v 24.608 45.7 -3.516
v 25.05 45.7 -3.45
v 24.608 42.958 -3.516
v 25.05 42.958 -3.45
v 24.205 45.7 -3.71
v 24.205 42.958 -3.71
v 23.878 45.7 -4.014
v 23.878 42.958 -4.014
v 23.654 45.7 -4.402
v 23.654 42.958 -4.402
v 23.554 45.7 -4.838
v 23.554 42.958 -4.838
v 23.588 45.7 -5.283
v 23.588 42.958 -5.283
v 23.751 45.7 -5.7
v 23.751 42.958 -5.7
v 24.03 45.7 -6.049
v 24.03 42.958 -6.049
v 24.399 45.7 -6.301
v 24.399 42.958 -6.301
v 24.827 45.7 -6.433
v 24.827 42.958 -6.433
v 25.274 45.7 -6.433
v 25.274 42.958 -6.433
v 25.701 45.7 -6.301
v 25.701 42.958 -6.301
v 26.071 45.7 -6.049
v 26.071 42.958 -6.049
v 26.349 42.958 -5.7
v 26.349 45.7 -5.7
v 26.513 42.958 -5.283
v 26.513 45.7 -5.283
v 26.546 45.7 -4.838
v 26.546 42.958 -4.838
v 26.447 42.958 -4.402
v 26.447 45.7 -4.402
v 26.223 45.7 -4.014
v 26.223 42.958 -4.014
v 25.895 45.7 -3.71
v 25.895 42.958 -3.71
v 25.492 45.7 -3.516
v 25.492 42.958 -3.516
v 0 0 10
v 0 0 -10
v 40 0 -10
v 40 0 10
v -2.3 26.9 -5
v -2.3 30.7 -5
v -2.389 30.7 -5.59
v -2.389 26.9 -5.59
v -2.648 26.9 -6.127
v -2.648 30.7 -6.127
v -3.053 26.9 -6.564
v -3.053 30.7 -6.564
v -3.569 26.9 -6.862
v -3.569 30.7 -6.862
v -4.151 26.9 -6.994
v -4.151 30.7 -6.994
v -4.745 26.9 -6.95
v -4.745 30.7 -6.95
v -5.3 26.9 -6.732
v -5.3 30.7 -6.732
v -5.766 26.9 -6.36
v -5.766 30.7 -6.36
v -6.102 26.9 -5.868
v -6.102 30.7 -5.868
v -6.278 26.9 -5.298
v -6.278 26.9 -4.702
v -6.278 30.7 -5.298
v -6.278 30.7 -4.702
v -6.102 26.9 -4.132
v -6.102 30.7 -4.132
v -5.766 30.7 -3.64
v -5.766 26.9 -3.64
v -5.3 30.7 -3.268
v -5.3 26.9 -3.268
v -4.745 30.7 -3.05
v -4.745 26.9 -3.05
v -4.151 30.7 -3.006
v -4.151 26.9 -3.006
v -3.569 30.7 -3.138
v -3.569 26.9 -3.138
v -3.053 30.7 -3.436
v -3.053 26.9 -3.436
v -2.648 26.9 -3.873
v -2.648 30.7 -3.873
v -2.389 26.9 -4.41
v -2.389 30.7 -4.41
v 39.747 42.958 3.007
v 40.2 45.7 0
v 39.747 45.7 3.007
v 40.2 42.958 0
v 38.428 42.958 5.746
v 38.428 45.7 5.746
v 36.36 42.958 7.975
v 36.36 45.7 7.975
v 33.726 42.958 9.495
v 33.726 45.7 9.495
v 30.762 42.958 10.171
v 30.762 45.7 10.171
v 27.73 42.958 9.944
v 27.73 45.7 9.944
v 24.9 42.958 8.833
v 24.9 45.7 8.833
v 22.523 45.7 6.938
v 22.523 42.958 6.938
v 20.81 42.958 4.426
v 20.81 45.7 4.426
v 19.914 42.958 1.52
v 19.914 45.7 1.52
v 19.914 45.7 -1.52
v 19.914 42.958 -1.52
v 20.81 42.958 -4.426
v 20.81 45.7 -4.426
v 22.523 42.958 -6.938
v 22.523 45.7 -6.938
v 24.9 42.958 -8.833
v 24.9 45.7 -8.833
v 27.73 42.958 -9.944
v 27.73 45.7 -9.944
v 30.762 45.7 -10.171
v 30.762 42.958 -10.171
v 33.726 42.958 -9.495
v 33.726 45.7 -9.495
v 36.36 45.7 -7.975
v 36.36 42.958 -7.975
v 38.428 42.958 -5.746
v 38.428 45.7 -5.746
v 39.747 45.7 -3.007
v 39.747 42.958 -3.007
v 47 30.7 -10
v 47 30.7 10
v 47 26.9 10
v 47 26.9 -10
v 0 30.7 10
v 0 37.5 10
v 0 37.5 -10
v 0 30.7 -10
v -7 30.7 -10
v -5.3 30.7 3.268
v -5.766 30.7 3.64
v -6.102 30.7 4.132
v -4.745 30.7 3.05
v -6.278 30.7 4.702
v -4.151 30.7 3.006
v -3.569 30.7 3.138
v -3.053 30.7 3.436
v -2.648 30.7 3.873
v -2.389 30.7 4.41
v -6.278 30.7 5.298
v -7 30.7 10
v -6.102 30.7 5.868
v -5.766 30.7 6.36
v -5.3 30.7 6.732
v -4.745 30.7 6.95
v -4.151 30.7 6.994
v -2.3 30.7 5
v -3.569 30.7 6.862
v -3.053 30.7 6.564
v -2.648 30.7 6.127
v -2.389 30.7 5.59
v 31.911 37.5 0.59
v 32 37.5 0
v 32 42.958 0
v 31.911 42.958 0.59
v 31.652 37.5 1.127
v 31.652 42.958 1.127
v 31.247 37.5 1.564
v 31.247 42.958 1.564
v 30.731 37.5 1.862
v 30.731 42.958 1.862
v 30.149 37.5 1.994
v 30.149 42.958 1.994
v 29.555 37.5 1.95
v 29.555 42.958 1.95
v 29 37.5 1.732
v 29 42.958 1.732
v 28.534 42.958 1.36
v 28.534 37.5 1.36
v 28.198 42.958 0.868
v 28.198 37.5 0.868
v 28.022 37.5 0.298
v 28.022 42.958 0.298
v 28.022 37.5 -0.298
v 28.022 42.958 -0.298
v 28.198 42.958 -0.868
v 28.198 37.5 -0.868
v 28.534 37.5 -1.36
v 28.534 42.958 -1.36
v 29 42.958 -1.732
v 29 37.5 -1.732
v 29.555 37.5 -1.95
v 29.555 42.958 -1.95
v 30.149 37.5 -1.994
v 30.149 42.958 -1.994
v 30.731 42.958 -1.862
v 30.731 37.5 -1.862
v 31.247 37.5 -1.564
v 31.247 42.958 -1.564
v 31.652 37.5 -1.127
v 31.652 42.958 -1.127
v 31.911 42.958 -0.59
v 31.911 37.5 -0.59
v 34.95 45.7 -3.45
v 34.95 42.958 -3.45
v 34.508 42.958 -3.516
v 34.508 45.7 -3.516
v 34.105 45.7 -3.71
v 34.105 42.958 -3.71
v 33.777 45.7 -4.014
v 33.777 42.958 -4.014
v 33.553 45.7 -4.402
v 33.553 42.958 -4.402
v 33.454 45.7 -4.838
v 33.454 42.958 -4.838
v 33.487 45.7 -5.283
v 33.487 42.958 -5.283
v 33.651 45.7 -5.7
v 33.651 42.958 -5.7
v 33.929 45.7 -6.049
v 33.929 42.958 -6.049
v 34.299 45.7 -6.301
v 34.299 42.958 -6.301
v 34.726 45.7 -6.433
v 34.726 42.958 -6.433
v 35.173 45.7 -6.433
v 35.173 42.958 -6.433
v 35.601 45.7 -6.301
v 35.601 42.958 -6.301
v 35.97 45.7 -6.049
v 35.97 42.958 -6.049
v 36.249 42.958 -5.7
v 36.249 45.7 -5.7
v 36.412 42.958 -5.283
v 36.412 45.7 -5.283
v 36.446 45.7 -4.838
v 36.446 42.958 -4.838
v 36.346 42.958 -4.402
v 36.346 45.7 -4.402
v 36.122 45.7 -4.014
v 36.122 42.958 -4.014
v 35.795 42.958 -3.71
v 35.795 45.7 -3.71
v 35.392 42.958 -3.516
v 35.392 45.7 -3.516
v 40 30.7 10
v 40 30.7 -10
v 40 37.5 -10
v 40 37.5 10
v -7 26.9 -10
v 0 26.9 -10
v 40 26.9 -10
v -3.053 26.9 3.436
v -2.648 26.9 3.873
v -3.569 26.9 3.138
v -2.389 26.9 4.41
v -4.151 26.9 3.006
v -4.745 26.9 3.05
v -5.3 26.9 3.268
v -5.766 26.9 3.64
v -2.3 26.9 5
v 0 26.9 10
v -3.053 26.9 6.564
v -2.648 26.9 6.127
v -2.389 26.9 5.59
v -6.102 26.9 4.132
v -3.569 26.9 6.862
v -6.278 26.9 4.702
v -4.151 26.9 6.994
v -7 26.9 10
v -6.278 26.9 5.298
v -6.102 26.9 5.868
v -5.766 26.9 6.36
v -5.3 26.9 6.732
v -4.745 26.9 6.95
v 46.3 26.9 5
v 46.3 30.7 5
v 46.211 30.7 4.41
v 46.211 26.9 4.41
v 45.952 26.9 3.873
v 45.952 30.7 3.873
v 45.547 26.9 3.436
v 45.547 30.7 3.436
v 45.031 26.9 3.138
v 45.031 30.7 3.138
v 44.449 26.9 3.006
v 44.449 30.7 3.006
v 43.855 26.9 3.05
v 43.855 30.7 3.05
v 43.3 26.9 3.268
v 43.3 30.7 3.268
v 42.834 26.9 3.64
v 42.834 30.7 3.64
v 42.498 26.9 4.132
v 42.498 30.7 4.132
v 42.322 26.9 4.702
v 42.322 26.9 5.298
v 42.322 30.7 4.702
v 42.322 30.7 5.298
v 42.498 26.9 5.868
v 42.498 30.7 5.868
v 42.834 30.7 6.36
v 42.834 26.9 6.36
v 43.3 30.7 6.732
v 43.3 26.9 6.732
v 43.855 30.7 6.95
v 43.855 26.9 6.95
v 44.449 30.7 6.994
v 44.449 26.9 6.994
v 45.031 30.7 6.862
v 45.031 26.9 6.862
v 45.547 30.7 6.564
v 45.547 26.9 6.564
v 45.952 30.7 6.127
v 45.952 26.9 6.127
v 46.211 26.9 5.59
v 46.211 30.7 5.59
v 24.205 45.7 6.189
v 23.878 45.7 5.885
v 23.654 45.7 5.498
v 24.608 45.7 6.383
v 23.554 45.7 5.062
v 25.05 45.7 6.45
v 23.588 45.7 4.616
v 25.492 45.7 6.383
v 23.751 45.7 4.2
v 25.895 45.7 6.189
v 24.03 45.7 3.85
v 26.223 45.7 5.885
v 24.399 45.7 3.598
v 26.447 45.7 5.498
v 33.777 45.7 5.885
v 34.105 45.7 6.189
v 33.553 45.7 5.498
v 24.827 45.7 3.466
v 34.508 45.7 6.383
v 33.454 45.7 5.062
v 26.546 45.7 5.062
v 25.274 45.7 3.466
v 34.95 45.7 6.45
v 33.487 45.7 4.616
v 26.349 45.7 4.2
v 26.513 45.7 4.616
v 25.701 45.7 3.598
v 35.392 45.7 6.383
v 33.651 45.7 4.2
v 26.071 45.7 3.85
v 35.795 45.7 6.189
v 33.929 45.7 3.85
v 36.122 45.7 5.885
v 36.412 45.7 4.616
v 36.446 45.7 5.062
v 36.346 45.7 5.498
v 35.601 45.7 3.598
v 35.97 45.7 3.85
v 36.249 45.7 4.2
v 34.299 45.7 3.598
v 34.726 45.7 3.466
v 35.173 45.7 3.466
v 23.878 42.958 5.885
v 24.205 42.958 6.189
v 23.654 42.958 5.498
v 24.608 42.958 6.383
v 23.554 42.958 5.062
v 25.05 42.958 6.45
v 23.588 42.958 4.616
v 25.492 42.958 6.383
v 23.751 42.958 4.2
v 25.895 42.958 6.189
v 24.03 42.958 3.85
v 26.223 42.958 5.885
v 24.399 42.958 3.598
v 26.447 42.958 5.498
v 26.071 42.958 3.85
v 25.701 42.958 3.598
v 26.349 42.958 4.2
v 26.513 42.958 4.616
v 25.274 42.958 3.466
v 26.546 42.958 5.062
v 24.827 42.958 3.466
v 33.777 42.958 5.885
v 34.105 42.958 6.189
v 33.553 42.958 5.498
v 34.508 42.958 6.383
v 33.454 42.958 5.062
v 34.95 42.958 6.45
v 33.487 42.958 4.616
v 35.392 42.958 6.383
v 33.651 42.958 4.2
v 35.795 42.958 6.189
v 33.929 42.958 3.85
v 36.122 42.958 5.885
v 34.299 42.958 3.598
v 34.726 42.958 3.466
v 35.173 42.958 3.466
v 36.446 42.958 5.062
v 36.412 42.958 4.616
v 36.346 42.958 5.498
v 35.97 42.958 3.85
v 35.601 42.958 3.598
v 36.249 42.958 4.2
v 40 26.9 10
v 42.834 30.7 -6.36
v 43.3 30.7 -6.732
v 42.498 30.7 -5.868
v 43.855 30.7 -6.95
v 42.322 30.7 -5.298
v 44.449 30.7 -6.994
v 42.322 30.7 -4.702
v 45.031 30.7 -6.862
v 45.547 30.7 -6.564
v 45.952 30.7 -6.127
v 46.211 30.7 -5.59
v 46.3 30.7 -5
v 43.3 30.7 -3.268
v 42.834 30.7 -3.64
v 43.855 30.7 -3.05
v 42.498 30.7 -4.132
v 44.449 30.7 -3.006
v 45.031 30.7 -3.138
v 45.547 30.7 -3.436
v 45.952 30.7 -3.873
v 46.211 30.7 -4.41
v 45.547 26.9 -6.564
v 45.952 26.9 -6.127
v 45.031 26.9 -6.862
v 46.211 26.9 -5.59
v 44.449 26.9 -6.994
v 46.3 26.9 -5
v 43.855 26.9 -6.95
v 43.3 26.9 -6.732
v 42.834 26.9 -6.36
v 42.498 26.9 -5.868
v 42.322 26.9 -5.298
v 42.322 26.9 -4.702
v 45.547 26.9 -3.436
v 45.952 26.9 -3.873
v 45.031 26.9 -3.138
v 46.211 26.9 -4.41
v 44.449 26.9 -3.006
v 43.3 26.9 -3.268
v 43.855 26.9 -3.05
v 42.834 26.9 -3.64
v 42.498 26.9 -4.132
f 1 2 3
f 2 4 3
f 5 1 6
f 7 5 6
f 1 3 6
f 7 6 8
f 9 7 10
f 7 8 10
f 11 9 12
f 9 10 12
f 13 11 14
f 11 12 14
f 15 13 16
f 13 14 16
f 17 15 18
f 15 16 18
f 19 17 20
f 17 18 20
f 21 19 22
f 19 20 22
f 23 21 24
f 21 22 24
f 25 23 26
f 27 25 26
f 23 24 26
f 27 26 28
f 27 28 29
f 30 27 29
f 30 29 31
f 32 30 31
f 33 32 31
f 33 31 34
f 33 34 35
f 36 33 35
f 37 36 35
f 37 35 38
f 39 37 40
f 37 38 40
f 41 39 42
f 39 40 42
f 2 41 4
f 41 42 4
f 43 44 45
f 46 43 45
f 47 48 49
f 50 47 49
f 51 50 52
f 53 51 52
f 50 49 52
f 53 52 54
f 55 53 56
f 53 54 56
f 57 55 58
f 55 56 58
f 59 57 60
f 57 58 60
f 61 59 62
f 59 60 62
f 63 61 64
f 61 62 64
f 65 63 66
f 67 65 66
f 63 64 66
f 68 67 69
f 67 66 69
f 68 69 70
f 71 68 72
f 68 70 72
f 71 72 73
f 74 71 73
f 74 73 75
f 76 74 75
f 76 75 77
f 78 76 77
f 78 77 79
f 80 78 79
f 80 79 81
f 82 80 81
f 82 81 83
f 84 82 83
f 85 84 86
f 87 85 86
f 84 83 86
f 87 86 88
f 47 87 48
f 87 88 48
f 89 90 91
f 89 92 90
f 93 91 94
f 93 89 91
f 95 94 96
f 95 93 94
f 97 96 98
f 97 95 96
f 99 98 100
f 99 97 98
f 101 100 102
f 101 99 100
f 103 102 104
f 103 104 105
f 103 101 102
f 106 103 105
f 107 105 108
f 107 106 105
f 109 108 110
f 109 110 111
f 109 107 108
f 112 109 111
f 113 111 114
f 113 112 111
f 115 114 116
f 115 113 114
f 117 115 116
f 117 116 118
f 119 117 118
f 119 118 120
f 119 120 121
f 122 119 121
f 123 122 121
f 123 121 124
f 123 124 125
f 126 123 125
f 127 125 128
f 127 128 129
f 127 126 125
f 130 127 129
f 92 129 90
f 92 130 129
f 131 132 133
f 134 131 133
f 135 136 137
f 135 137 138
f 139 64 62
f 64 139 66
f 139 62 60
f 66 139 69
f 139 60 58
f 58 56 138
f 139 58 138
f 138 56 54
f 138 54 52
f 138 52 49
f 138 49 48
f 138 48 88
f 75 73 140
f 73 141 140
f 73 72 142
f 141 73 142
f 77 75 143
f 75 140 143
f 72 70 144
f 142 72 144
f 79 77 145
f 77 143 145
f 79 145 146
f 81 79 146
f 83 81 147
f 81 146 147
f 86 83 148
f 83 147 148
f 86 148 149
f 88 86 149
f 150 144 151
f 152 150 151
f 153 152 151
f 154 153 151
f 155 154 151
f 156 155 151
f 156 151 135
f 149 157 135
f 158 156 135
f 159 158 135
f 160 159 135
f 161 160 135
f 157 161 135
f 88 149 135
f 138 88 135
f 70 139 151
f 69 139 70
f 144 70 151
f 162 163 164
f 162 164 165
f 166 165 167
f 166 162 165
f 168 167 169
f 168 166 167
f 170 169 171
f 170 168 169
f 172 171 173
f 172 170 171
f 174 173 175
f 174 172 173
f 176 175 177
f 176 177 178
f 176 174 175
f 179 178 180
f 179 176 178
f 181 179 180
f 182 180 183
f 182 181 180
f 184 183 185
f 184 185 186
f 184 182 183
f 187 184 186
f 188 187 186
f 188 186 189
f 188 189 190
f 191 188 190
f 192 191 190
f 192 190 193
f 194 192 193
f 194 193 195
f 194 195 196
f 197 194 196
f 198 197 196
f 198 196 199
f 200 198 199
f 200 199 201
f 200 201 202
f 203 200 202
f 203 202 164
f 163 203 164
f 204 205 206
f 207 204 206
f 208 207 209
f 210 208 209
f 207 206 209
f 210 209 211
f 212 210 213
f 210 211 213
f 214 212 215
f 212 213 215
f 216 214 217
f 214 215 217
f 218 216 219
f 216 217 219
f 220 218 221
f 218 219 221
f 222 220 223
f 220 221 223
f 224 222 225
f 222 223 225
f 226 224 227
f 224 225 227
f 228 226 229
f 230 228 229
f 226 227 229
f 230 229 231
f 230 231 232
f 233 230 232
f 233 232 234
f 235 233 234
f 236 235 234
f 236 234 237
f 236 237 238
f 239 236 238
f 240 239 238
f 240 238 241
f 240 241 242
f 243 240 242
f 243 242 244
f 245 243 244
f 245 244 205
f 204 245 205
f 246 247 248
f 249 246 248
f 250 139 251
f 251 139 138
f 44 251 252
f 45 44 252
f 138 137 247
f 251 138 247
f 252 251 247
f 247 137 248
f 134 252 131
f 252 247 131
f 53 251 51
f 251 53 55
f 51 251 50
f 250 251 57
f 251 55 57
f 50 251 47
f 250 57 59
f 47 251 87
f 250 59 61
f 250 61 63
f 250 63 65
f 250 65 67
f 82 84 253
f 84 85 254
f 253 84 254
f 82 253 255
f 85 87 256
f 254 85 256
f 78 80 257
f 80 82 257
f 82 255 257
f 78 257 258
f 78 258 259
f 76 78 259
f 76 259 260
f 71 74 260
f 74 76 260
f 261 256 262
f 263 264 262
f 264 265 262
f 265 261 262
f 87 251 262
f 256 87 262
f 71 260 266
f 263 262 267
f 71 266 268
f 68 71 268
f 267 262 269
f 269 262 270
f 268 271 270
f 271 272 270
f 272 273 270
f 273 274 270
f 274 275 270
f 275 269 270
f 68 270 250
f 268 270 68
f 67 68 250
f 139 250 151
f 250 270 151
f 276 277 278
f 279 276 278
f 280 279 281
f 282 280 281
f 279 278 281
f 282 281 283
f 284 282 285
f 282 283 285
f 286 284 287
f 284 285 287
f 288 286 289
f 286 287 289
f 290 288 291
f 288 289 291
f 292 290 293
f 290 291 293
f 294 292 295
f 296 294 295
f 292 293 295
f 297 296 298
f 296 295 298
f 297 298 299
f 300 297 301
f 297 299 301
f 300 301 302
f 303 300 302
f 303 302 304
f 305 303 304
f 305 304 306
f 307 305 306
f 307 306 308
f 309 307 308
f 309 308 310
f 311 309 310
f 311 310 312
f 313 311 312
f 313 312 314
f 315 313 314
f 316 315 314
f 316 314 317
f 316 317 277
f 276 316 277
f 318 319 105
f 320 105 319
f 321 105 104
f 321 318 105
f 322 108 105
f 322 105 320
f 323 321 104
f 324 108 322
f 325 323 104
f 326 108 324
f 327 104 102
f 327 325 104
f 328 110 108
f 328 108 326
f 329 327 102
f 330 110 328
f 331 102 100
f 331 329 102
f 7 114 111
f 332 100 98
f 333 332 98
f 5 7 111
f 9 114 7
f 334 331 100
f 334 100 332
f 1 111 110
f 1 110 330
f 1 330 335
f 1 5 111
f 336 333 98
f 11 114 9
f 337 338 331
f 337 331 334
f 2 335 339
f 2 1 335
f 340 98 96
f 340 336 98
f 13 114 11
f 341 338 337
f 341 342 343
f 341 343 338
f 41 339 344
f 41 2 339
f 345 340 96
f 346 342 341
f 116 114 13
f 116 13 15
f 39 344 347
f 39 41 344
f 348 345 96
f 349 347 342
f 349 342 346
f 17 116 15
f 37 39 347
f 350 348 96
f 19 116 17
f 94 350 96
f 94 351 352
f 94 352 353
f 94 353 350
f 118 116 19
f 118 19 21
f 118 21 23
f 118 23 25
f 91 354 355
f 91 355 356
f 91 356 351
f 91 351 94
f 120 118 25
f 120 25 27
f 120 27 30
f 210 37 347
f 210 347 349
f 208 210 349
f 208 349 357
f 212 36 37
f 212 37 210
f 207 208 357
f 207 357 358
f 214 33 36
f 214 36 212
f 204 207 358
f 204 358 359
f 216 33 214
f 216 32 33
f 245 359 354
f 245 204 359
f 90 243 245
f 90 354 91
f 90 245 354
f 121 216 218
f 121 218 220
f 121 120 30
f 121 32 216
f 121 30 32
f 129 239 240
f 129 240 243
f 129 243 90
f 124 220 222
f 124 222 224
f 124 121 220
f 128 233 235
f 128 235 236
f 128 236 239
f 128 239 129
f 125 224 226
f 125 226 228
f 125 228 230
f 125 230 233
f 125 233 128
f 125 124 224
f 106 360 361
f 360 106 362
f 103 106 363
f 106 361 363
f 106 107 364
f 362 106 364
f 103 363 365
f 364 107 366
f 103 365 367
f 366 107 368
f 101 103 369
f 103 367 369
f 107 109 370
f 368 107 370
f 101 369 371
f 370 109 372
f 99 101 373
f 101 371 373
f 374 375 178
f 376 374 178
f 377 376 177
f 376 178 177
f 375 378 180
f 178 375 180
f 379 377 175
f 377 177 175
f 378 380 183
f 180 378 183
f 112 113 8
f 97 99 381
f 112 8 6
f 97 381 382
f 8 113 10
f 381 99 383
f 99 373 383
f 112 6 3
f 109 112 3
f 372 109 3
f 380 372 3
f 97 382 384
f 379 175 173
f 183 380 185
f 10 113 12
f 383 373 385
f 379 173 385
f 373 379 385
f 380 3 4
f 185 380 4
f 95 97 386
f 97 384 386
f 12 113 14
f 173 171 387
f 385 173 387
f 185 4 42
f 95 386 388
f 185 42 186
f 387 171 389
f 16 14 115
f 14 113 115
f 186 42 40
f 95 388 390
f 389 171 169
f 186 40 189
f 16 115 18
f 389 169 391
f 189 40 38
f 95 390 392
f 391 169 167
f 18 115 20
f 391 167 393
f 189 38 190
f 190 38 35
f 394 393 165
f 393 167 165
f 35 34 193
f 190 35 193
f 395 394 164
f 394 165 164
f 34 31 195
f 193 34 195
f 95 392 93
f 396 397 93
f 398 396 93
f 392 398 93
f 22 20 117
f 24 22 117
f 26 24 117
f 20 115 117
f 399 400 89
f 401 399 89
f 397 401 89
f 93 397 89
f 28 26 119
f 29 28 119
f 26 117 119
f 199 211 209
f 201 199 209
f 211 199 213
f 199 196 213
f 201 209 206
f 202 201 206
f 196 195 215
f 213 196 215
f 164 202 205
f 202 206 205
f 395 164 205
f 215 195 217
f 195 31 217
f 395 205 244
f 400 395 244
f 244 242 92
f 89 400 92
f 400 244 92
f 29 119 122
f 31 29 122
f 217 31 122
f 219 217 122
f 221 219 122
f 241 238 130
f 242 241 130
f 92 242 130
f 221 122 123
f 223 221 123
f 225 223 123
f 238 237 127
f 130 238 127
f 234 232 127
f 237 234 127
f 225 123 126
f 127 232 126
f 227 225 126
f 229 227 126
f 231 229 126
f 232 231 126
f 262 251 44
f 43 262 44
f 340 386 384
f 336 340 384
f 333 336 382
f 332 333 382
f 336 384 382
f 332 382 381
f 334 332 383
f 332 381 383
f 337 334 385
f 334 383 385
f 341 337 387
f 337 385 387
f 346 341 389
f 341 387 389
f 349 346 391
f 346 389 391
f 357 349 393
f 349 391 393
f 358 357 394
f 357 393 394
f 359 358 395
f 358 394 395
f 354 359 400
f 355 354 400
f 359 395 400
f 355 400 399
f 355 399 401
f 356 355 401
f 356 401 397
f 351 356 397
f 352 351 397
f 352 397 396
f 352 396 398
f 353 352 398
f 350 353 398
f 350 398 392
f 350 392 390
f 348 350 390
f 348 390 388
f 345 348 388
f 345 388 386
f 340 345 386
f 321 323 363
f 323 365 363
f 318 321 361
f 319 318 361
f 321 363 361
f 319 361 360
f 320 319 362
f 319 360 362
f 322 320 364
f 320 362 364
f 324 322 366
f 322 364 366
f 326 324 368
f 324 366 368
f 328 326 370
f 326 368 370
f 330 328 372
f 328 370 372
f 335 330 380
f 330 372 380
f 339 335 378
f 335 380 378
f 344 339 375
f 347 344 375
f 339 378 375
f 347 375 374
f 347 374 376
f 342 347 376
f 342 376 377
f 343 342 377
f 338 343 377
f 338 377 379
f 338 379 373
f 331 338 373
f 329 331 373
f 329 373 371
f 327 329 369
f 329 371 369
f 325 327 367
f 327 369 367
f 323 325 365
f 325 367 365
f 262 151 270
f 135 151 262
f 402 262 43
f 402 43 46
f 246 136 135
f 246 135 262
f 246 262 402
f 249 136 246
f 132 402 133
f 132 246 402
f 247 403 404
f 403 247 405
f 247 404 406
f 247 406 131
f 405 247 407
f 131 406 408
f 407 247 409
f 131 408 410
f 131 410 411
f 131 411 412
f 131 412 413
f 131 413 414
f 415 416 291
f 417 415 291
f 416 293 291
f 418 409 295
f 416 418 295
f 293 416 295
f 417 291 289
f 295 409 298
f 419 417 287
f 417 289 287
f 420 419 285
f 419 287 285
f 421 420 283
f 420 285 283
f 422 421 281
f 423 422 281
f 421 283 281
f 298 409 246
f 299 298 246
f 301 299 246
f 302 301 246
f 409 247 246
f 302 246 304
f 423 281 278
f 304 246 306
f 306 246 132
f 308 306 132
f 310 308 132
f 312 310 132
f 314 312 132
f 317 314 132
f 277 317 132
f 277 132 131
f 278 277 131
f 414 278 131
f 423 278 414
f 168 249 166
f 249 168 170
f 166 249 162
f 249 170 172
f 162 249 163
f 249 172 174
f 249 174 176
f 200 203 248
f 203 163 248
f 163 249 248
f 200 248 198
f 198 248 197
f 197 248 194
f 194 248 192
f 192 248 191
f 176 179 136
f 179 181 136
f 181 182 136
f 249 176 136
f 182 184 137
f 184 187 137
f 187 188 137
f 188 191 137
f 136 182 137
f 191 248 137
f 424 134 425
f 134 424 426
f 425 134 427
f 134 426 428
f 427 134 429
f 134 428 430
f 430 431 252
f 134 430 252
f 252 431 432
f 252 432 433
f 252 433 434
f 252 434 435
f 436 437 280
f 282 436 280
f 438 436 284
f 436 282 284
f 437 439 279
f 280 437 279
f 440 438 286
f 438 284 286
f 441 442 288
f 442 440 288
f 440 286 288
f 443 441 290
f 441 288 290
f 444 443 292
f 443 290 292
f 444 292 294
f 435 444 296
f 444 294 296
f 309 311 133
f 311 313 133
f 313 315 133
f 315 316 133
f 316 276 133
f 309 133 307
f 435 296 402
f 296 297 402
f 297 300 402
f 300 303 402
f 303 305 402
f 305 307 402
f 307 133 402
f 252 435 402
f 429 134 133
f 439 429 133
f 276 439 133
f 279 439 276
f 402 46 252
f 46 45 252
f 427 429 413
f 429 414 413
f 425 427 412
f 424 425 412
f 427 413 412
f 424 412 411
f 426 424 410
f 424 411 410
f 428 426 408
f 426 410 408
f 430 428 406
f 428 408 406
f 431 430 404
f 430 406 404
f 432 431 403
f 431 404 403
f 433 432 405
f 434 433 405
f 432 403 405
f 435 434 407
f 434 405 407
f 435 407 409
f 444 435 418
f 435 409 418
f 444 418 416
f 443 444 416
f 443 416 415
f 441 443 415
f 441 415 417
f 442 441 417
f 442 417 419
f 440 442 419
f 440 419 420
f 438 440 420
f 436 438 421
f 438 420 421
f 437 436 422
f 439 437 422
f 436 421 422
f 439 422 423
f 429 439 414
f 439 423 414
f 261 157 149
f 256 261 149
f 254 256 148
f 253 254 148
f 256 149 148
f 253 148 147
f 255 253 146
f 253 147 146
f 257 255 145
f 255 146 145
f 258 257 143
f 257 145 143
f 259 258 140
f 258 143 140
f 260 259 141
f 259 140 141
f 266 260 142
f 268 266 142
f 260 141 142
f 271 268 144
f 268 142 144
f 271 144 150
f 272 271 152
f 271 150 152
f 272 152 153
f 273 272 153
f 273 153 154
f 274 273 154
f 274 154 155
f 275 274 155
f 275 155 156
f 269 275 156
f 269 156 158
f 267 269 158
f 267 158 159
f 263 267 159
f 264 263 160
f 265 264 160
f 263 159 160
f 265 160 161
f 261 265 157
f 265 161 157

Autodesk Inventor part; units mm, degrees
ref_plane "YZ Plane" through (0, 0, 0) normal (1, 0, 0) x (0, 1, 0)
ref_plane "XZ Plane" through (0, 0, 0) normal (0, 1, 0) x (-1, 0, 0)
ref_plane "XY Plane" through (0, 0, 0) normal (0, 0, 1) x (1, 0, 0)
sketch "草圖1" plane through (0, 0, 0) normal (0, 0, 1) x (1, 0, 0)
  line L0 (0, 0) -> (40, 0)
  line L1 (40, 0) -> (40, 37.5)
  line L2 (40, 37.5) -> (0, 37.5)
  line L3 (0, 37.5) -> (0, 0)
  dimension "d0" = 37.5
  dimension "d1" = 40
extrude "擠出1" add sketch "草圖1" along normal mid plane 20
sketch "草圖2" plane through (0, 0, 10) normal (0, 0, 1) x (1, 0, 0)
  line L0 (-7, 31.9) -> (47, 31.9)
  line L1 (47, 31.9) -> (47, 26.9)
  line L2 (47, 26.9) -> (-7, 26.9)
  line L3 (-7, 26.9) -> (-7, 31.9)
  line L4 (0, 37.5) -> (0, 0) projected
  line L5 (0, 0) -> (40, 0) projected
  dimension "d4" = 54
  dimension "d5" = 7
  dimension "d6" = 26.9
  dimension "d7" = 5
extrude "擠出2" add sketch "草圖2" against normal blind 20
sketch "草圖3" plane through (-7, 31.9, 10) normal (0, 1, 0) x (1, 0, 0)
  line L0 (2.7, 15) -> (51.3, 15)
  line L1 (51.3, 15) -> (51.3, 5)
  line L2 (51.3, 5) -> (2.7, 5)
  line L3 (2.7, 5) -> (2.7, 15)
  line L4 (47, 20) -> (54, 20) projected
  line L5 (54, 0) -> (54, 20) projected
  circle A0 centre (2.7, 15) radius 2
  circle A1 centre (2.7, 5) radius 2
  circle A2 centre (51.3, 5) radius 2
  circle A3 centre (51.3, 15) radius 2
  point P0 (7, 10)
  dimension "d10" = 10
  dimension "d11" = 5
  dimension "d12" = 2.7
  dimension "d13" = 48.6
  dimension "d14" = 4
extrude "擠出3" cut sketch "草圖3" against normal blind 20 contours L3 A0 L0 | L0 A0 L3 | A3 L1 L0 | L0 L1 A3 | A1 L2 L3 | L3 L2 A1 | A2 L2 L1 | L1 L2 A2
sketch "草圖4" plane through (0, 0, 0) normal (0, 0, 1) x (1, 0, 0)
  line L0 (0, 37.5) -> (40, 37.5) projected
  line L1 (32, 37.5) -> (30, 37.5)
  line L2 (30, 37.5) -> (30, 45.7)
  line L3 (30, 45.7) -> (32, 45.7)
  line L4 (32, 45.7) -> (32, 37.5)
  line L5 (-2.3, 26.9) -> (-6.3, 26.9) projected
  line L6 (-6.3, 31.9) -> (-2.3, 31.9) projected
  line L7 (-4.3, 26.9) -> (-4.3, 31.9)
  line L8 (40, 0) -> (0, 0) projected
  line L9 (30, 45.7) -> (40.2, 45.7)
  line L10 (40.2, 45.7) -> (40.2, 42.9583)
  line L11 (40.2, 42.9583) -> (30, 42.9583)
  line L12 (30, 42.9583) -> (30, 45.7)
  dimension "d17" = 34.3
  dimension "d18" = 45.7
  dimension "d19" = 2
  dimension "d20" = 10.2
revolve "迴轉1" add sketch "草圖4" angle 360 about axis through (30, 37.5, 0) along (0, 1, 0)
sketch "草圖5" plane through (30, 45.7, 0) normal (0, 1, 0) x (1, 0, 0)
  line L0 (-4.9497, -4.9497) -> (4.9497, -4.9497)
  line L1 (4.9497, -4.9497) -> (4.9497, 4.9497)
  line L2 (4.9497, 4.9497) -> (-4.9497, 4.9497)
  line L3 (-4.9497, 4.9497) -> (-4.9497, -4.9497)
  line L4 (-4.9497, -4.9497) -> (4.9497, 4.9497) construction
  line L5 (4.9497, -4.9497) -> (-4.9497, 4.9497) construction
  circle A0 centre (0, 0) radius 10.2 projected
  point P0 (-30, 0)
  point P1 (0, 0)
  dimension "d22" = 14
hole "孔1" at (34.9497, 45.7, -4.9497) at (34.9497, 45.7, 4.9497) at (25.0503, 45.7, 4.9497) at (25.0503, 45.7, -4.9497) direction (0, -1, 0) diameter 3 depth 4 tip angle 118
move faces "移動1" translate (0, -1.2, 0) faces at (-0.786, 31.9, -1.5071)
move faces "移動2" translate (0, -1.2, 0) faces at (40.786, 31.9, 1.5071)
properties part number "MG996 伺服馬達"
